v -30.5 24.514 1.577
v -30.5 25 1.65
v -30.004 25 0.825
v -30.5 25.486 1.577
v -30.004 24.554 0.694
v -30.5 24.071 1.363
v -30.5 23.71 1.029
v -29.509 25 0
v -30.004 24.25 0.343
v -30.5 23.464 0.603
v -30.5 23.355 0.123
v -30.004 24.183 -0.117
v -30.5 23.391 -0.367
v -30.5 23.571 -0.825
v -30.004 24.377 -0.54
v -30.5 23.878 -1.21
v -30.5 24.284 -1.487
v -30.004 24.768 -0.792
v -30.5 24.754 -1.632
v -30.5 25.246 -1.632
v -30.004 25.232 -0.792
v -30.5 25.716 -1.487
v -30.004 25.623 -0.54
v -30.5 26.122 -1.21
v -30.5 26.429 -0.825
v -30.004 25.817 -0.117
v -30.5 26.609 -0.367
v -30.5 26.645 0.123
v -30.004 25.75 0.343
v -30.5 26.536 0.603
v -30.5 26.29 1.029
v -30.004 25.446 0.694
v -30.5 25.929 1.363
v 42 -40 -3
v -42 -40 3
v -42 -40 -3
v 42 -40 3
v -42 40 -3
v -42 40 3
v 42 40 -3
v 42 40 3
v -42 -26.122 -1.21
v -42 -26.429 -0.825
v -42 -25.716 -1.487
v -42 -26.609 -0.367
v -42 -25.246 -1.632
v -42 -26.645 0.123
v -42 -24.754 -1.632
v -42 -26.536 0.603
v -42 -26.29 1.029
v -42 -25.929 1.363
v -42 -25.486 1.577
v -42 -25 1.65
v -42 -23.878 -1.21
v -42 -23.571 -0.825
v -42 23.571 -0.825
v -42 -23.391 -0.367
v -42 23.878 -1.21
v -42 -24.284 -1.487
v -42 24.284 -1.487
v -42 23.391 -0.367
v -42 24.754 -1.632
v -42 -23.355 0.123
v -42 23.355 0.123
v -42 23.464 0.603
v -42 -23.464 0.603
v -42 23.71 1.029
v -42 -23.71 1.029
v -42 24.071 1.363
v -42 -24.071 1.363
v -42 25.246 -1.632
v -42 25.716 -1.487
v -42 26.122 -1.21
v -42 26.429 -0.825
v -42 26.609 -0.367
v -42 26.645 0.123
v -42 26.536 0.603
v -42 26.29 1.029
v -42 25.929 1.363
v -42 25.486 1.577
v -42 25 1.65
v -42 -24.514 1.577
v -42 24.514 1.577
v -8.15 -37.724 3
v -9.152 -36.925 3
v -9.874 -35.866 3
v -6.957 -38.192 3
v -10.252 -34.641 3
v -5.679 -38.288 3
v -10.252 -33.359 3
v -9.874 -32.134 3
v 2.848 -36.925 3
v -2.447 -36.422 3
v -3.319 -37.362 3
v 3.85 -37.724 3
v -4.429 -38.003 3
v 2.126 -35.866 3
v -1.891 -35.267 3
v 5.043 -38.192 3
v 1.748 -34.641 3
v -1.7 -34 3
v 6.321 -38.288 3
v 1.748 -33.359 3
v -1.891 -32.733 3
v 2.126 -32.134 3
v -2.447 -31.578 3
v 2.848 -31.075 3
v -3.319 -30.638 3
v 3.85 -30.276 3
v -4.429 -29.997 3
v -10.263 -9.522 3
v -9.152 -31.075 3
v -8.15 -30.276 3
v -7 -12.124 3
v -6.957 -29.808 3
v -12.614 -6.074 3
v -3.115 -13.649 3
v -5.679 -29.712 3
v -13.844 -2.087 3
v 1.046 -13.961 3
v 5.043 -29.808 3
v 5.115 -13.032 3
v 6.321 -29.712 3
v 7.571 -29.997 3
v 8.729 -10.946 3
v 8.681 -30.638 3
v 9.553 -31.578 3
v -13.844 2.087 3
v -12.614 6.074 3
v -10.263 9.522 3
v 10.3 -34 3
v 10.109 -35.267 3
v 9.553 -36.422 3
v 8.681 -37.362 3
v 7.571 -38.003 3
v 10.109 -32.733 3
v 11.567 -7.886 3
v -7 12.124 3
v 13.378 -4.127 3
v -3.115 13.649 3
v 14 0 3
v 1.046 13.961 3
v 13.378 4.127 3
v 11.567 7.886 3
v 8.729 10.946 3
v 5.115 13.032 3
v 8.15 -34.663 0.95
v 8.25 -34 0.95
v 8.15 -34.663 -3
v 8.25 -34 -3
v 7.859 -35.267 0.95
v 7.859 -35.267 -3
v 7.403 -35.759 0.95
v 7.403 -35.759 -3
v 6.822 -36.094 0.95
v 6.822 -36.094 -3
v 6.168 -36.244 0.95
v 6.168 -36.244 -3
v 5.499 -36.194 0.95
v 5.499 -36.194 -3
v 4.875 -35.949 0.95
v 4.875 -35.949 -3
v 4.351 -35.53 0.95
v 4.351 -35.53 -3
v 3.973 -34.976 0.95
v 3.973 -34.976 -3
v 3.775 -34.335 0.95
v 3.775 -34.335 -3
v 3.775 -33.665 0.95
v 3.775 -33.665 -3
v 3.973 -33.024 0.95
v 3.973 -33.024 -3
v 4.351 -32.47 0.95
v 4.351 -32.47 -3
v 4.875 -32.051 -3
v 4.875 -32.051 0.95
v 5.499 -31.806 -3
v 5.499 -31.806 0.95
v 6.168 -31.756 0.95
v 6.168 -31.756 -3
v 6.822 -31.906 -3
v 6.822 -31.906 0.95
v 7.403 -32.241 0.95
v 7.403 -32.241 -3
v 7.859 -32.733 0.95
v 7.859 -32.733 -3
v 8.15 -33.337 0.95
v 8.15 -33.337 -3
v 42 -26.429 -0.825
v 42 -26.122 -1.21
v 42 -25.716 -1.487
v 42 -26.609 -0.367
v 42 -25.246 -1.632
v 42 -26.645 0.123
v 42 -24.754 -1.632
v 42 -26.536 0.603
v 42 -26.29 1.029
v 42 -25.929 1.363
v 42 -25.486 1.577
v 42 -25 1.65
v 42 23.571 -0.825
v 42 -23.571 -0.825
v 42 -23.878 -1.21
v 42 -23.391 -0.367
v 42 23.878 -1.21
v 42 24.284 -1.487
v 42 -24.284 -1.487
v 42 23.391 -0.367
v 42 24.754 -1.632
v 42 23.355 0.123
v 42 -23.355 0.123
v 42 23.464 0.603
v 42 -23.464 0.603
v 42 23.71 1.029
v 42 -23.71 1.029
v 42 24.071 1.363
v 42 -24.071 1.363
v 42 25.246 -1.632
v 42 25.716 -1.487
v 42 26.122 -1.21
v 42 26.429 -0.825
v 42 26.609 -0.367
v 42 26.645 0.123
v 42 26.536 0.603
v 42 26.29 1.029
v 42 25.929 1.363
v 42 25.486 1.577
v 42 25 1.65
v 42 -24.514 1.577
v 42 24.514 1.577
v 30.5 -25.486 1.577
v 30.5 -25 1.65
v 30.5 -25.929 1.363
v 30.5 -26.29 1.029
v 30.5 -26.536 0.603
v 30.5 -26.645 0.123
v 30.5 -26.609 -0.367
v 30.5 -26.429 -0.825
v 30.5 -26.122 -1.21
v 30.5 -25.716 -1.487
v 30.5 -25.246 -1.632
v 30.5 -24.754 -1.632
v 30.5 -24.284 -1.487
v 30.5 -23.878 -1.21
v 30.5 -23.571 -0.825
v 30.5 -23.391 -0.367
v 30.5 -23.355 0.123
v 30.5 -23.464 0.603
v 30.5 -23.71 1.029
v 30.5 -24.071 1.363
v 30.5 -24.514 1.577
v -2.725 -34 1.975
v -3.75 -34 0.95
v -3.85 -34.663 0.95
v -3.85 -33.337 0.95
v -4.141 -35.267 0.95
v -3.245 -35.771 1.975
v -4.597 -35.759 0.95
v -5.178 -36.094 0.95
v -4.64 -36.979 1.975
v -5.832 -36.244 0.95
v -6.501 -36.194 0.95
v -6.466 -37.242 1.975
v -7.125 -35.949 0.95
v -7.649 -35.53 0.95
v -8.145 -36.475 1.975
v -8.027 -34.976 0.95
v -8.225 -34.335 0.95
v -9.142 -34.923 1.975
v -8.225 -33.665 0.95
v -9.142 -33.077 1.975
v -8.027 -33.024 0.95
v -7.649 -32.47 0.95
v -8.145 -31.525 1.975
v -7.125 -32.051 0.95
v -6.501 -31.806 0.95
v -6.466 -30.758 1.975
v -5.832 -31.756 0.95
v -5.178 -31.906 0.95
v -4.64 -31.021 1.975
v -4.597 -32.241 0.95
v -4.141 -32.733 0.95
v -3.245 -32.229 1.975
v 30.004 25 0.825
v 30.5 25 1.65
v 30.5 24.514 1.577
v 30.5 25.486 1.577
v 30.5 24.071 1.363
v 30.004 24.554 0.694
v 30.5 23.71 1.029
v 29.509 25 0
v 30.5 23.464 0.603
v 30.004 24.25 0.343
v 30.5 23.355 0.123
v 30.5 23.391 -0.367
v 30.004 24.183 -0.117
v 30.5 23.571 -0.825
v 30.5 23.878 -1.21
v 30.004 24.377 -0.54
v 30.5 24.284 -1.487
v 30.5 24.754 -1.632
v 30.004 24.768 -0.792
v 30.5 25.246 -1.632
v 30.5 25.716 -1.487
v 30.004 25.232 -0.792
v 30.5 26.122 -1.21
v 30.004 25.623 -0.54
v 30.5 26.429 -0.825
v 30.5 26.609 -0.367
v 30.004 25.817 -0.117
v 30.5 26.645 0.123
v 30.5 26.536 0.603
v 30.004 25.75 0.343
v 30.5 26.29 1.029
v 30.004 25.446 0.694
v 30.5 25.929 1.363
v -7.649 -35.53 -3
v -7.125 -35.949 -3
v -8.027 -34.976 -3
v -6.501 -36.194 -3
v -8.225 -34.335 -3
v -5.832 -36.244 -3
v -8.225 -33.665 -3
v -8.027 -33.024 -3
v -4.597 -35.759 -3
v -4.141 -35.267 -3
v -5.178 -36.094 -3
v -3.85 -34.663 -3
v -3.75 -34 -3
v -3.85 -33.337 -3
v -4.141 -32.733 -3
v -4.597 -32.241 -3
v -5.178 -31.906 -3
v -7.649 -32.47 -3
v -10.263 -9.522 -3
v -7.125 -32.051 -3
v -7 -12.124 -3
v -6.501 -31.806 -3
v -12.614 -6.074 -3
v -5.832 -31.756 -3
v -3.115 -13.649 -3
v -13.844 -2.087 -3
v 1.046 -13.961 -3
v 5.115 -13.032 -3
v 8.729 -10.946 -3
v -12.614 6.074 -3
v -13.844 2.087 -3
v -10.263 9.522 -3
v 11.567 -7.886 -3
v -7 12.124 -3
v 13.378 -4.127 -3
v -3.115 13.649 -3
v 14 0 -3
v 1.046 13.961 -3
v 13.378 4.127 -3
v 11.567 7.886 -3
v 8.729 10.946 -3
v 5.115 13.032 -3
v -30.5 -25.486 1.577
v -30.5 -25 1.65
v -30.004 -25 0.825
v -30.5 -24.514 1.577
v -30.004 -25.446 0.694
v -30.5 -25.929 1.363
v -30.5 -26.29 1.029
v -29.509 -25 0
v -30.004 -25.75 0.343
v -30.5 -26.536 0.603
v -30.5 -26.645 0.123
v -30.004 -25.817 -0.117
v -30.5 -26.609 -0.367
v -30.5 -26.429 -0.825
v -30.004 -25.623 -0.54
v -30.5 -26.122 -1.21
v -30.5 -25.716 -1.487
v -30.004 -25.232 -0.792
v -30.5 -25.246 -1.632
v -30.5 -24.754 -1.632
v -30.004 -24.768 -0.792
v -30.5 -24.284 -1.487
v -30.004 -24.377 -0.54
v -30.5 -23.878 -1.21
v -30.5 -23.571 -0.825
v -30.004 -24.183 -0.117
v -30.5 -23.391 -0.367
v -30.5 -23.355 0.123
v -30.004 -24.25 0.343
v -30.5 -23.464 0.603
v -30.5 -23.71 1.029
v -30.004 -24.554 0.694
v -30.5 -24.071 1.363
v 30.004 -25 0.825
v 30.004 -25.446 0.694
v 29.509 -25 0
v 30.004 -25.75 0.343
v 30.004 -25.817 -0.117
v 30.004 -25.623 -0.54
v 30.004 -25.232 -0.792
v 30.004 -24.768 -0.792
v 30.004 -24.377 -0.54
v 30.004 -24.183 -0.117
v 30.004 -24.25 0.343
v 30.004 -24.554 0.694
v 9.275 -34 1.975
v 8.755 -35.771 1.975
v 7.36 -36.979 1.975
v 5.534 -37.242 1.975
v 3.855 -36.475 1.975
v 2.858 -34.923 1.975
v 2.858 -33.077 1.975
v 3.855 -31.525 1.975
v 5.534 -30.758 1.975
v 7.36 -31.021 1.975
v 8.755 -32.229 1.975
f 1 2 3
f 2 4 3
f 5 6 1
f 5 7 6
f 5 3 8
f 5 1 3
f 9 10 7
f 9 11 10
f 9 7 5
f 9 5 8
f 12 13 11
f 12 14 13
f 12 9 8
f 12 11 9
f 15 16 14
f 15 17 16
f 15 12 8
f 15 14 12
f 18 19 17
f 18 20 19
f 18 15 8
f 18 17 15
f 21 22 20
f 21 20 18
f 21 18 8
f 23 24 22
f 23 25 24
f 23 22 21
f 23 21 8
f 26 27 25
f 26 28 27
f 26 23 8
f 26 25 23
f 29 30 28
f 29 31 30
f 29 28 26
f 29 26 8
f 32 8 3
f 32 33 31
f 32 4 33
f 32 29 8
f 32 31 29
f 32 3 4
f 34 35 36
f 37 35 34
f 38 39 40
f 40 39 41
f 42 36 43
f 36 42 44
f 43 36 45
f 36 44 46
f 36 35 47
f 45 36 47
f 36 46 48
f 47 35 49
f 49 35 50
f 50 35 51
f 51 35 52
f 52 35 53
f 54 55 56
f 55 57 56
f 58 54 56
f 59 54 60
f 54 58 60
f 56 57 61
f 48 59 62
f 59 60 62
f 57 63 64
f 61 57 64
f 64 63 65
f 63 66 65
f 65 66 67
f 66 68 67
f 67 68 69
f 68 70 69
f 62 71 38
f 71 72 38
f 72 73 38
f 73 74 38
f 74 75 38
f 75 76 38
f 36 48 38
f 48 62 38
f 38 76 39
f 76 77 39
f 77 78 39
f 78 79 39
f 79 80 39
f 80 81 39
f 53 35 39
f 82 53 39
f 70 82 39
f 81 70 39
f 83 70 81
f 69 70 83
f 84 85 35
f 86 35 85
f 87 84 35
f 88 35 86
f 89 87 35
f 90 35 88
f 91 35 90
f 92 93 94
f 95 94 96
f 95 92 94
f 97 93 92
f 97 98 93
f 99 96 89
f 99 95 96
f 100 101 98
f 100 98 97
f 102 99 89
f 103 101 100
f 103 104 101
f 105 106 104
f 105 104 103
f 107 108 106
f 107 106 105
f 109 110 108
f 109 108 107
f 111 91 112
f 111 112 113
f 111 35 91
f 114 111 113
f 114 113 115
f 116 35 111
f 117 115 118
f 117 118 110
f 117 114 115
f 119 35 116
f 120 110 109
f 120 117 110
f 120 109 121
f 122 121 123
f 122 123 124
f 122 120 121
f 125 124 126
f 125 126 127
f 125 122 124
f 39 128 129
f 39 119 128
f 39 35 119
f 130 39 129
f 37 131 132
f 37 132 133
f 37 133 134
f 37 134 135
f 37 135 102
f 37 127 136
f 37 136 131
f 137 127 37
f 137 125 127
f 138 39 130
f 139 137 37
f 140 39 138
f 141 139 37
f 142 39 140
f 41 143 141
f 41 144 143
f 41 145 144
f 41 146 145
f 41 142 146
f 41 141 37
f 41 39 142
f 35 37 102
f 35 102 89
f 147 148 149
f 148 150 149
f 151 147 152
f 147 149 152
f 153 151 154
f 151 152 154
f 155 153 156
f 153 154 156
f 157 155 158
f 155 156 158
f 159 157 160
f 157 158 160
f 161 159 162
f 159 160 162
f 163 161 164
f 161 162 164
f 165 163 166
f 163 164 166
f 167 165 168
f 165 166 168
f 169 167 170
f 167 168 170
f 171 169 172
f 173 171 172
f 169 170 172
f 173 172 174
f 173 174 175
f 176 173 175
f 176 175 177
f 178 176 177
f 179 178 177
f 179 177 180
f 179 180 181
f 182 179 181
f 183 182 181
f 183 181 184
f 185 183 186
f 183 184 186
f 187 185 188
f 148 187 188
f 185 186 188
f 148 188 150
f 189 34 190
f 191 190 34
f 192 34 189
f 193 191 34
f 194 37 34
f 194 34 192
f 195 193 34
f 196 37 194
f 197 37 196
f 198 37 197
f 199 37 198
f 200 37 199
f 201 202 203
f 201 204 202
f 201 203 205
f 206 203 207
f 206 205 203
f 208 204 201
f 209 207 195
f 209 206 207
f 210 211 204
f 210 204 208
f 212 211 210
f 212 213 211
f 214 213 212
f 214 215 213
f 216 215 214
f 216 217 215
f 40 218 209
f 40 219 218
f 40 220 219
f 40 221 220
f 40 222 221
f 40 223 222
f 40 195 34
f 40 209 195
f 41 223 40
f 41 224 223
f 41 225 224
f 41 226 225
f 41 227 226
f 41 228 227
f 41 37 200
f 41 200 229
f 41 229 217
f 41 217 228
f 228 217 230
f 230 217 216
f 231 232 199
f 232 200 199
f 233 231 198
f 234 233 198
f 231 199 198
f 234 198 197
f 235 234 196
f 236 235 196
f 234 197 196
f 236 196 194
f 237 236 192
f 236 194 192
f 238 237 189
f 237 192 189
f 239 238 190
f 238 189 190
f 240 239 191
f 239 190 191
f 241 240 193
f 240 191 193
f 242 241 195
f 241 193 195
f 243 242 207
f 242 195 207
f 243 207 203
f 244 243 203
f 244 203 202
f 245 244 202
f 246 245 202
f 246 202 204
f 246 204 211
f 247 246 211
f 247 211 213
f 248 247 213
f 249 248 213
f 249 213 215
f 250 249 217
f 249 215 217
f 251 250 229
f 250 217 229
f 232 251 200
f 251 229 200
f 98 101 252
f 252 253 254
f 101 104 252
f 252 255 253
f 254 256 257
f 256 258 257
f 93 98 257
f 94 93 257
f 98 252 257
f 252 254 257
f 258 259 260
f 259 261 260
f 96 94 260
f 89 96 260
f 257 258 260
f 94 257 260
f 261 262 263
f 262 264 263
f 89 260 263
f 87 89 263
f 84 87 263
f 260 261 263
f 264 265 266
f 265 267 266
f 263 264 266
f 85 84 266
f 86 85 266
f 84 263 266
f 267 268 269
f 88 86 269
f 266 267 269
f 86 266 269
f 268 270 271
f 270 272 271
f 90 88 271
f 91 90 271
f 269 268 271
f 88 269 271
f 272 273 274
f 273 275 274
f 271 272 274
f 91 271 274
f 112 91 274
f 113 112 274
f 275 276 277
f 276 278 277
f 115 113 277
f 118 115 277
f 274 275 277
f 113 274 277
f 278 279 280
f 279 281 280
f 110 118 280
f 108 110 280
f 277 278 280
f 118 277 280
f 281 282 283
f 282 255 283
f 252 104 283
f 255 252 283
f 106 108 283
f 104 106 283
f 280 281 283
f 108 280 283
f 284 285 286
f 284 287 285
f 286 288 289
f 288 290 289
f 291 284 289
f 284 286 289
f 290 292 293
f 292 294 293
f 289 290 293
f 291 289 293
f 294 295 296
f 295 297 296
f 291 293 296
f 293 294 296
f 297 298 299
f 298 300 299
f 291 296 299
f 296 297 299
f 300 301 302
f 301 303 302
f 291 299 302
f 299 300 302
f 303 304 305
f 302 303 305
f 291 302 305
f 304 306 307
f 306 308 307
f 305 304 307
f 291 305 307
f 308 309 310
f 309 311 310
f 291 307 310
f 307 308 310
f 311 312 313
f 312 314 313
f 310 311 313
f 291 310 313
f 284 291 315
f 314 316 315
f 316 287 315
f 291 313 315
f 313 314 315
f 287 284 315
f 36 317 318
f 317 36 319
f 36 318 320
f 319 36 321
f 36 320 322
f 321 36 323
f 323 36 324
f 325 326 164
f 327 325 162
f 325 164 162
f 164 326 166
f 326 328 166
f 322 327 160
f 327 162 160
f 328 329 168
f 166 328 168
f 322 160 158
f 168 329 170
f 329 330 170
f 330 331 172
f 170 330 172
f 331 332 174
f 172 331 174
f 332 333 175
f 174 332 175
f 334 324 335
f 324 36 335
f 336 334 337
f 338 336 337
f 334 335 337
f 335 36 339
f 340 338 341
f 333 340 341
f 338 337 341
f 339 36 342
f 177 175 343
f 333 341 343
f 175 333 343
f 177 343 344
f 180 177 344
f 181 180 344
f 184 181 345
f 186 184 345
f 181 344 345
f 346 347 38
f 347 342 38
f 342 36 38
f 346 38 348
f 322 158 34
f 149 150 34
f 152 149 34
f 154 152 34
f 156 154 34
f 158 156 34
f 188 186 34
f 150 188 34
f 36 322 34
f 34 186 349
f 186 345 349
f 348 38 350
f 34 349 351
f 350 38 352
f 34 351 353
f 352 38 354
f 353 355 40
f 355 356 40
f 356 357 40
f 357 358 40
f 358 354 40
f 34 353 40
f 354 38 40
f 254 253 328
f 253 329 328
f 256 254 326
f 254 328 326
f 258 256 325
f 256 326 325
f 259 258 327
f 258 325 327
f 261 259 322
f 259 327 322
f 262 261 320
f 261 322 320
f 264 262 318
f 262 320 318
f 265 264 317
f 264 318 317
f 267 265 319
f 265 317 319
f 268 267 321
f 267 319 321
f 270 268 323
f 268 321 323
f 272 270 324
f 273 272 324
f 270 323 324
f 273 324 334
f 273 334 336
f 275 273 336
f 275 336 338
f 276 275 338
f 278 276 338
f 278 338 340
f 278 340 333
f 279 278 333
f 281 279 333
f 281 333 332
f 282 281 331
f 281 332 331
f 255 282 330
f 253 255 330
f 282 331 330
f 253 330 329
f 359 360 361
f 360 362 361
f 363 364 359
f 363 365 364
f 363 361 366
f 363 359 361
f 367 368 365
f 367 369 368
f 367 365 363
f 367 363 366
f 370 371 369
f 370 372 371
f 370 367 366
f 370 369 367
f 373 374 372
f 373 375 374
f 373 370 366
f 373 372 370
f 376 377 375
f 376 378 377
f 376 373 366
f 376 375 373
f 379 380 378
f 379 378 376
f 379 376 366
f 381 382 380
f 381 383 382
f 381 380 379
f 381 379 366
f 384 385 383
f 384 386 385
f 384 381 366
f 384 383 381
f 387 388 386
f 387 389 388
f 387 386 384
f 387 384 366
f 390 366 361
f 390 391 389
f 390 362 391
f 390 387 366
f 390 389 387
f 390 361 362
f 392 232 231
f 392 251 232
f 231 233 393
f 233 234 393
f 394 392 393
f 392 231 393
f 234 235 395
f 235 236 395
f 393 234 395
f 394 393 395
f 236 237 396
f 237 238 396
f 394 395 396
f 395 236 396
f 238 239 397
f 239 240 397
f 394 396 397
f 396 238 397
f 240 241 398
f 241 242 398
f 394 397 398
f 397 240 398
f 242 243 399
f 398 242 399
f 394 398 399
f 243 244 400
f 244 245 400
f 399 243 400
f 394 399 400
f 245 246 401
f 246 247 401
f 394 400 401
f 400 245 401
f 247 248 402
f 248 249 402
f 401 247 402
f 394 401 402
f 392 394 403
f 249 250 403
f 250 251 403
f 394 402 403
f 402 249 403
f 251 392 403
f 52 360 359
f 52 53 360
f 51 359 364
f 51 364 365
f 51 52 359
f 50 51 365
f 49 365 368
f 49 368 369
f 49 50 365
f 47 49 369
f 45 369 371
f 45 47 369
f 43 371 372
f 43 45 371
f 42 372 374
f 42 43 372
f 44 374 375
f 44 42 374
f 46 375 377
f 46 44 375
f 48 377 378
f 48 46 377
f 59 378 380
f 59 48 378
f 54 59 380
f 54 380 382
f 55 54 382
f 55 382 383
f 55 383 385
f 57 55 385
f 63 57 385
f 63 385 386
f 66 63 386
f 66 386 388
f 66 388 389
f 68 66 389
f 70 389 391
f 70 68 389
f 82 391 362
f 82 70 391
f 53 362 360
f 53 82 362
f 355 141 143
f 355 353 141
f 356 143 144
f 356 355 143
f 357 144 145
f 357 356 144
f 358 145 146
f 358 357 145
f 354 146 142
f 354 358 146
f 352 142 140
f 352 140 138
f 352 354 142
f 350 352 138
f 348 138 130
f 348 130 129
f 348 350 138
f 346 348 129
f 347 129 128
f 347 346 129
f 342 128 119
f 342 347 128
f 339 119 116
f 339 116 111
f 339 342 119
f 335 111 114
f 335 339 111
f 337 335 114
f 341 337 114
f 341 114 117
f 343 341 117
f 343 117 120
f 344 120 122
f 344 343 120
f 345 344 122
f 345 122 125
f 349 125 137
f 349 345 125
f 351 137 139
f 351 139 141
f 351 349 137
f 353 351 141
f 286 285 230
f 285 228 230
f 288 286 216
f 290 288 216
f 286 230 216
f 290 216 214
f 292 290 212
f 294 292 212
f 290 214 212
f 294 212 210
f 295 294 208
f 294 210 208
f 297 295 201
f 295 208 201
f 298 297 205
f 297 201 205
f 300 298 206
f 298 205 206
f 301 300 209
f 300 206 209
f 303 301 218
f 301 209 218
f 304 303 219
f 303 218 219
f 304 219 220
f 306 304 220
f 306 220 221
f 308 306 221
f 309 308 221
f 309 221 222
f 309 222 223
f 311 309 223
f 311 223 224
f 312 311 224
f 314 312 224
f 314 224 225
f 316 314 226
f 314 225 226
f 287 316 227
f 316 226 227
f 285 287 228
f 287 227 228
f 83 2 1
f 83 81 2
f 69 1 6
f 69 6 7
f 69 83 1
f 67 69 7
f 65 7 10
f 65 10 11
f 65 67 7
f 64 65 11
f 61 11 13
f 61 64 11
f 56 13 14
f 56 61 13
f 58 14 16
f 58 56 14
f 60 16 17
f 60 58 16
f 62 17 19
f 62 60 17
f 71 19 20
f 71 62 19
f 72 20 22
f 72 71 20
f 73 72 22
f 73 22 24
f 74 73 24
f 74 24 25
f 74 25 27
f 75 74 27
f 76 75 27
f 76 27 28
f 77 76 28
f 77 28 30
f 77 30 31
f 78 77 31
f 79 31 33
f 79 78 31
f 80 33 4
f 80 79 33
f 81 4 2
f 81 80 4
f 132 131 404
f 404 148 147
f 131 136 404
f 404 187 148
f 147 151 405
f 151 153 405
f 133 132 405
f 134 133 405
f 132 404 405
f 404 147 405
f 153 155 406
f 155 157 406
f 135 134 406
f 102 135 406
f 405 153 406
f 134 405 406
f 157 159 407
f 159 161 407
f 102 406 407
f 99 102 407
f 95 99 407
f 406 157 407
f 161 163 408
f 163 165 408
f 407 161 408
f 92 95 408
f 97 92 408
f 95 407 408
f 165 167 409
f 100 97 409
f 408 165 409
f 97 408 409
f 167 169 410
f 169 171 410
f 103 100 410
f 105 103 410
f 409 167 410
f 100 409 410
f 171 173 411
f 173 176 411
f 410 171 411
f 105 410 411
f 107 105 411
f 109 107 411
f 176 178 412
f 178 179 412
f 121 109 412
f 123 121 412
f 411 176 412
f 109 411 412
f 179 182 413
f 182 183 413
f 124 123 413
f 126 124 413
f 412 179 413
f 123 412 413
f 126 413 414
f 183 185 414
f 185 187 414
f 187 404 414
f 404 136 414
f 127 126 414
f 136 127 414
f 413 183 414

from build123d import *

# Parameters (mm, degrees)
SKETCH_1_W                  = 84
SKETCH_1_H                  = 80
SKETCH_1_R                  = 14
EXTRUDE_1_DEPTH             = 3
HOLE_WIZARD_M4_1_AT_2_COUNT = 2
HOLE_WIZARD_M4_1_AT_2_PITCH = 50
HOLE_WIZARD_1_D             = 4.5
HOLE_WIZARD_1_DEPTH         = 10
HOLE_WIZARD_1_CSINK_D       = 8.6
HOLE_WIZARD_1_CSINK_ANGLE   = 90
HOLE_WIZARD_1_TIP           = 1.351936393


with BuildPart() as part:
    # 草图1 → 凸台-拉伸1 (new, symmetric)
    with BuildSketch(Plane.XY):
        Rectangle(SKETCH_1_W, SKETCH_1_H)
        Circle(SKETCH_1_R, mode=Mode.SUBTRACT)
    extrude(amount=EXTRUDE_1_DEPTH, both=True)

    # 草图4 → M4 螺纹孔1 (revolve, cut)
    with BuildSketch(Plane(origin=(-42, 25, 0), x_dir=(0, 0, 1), z_dir=(0, 1, 0))):
        Polygon((0, 0), (0, 12.491420021), (1.65, 11.5), (1.65, 0), align=None)
    hole_wizard_m4_1 = revolve(axis=Axis((-48.35, 25, 0), (1, 0, 0)), mode=Mode.SUBTRACT)

    # M4 螺纹孔1 at 2: M4 螺纹孔1 ×2
    with Locations(*[(0, -i * HOLE_WIZARD_M4_1_AT_2_PITCH, 0) for i in range(1, HOLE_WIZARD_M4_1_AT_2_COUNT)]):
        add(hole_wizard_m4_1, mode=Mode.SUBTRACT)

    # 镜向1: M4 螺纹孔1 across plane
    add(hole_wizard_m4_1.mirror(Plane(origin=(0, 0, 0), x_dir=(0, 0, 1), z_dir=(1, 0, 0))), mode=Mode.SUBTRACT)

    # 镜向1 copy 1 sketch → 镜向1 copy 1 (revolve, cut)
    with BuildSketch(Plane(origin=(42, -25, 0), x_dir=(0, 0, 1), z_dir=(0, 1, 0))):
        Polygon((0, 0), (0, -12.491420021), (1.65, -11.5), (1.65, 0), align=None)
    revolve(axis=Axis((48.35, -25, 0), (1, 0, 0)), mode=Mode.SUBTRACT)

    # 打孔尺寸(%根据十字)槽沉头木螺钉的类型1
    with Locations(Plane(origin=(0, 0, 3), x_dir=(-1, 0, 0), z_dir=(0, 0, 1))):
        with Locations((6, 34), (-6, 34)):
            CounterSinkHole(HOLE_WIZARD_1_D / 2, HOLE_WIZARD_1_CSINK_D / 2, depth=HOLE_WIZARD_1_DEPTH, counter_sink_angle=HOLE_WIZARD_1_CSINK_ANGLE)
            with Locations((0, 0, -(HOLE_WIZARD_1_DEPTH + HOLE_WIZARD_1_TIP / 2))):  # 118° drill point
                Cone(0, HOLE_WIZARD_1_D / 2, HOLE_WIZARD_1_TIP, mode=Mode.SUBTRACT)


solid = part.part
